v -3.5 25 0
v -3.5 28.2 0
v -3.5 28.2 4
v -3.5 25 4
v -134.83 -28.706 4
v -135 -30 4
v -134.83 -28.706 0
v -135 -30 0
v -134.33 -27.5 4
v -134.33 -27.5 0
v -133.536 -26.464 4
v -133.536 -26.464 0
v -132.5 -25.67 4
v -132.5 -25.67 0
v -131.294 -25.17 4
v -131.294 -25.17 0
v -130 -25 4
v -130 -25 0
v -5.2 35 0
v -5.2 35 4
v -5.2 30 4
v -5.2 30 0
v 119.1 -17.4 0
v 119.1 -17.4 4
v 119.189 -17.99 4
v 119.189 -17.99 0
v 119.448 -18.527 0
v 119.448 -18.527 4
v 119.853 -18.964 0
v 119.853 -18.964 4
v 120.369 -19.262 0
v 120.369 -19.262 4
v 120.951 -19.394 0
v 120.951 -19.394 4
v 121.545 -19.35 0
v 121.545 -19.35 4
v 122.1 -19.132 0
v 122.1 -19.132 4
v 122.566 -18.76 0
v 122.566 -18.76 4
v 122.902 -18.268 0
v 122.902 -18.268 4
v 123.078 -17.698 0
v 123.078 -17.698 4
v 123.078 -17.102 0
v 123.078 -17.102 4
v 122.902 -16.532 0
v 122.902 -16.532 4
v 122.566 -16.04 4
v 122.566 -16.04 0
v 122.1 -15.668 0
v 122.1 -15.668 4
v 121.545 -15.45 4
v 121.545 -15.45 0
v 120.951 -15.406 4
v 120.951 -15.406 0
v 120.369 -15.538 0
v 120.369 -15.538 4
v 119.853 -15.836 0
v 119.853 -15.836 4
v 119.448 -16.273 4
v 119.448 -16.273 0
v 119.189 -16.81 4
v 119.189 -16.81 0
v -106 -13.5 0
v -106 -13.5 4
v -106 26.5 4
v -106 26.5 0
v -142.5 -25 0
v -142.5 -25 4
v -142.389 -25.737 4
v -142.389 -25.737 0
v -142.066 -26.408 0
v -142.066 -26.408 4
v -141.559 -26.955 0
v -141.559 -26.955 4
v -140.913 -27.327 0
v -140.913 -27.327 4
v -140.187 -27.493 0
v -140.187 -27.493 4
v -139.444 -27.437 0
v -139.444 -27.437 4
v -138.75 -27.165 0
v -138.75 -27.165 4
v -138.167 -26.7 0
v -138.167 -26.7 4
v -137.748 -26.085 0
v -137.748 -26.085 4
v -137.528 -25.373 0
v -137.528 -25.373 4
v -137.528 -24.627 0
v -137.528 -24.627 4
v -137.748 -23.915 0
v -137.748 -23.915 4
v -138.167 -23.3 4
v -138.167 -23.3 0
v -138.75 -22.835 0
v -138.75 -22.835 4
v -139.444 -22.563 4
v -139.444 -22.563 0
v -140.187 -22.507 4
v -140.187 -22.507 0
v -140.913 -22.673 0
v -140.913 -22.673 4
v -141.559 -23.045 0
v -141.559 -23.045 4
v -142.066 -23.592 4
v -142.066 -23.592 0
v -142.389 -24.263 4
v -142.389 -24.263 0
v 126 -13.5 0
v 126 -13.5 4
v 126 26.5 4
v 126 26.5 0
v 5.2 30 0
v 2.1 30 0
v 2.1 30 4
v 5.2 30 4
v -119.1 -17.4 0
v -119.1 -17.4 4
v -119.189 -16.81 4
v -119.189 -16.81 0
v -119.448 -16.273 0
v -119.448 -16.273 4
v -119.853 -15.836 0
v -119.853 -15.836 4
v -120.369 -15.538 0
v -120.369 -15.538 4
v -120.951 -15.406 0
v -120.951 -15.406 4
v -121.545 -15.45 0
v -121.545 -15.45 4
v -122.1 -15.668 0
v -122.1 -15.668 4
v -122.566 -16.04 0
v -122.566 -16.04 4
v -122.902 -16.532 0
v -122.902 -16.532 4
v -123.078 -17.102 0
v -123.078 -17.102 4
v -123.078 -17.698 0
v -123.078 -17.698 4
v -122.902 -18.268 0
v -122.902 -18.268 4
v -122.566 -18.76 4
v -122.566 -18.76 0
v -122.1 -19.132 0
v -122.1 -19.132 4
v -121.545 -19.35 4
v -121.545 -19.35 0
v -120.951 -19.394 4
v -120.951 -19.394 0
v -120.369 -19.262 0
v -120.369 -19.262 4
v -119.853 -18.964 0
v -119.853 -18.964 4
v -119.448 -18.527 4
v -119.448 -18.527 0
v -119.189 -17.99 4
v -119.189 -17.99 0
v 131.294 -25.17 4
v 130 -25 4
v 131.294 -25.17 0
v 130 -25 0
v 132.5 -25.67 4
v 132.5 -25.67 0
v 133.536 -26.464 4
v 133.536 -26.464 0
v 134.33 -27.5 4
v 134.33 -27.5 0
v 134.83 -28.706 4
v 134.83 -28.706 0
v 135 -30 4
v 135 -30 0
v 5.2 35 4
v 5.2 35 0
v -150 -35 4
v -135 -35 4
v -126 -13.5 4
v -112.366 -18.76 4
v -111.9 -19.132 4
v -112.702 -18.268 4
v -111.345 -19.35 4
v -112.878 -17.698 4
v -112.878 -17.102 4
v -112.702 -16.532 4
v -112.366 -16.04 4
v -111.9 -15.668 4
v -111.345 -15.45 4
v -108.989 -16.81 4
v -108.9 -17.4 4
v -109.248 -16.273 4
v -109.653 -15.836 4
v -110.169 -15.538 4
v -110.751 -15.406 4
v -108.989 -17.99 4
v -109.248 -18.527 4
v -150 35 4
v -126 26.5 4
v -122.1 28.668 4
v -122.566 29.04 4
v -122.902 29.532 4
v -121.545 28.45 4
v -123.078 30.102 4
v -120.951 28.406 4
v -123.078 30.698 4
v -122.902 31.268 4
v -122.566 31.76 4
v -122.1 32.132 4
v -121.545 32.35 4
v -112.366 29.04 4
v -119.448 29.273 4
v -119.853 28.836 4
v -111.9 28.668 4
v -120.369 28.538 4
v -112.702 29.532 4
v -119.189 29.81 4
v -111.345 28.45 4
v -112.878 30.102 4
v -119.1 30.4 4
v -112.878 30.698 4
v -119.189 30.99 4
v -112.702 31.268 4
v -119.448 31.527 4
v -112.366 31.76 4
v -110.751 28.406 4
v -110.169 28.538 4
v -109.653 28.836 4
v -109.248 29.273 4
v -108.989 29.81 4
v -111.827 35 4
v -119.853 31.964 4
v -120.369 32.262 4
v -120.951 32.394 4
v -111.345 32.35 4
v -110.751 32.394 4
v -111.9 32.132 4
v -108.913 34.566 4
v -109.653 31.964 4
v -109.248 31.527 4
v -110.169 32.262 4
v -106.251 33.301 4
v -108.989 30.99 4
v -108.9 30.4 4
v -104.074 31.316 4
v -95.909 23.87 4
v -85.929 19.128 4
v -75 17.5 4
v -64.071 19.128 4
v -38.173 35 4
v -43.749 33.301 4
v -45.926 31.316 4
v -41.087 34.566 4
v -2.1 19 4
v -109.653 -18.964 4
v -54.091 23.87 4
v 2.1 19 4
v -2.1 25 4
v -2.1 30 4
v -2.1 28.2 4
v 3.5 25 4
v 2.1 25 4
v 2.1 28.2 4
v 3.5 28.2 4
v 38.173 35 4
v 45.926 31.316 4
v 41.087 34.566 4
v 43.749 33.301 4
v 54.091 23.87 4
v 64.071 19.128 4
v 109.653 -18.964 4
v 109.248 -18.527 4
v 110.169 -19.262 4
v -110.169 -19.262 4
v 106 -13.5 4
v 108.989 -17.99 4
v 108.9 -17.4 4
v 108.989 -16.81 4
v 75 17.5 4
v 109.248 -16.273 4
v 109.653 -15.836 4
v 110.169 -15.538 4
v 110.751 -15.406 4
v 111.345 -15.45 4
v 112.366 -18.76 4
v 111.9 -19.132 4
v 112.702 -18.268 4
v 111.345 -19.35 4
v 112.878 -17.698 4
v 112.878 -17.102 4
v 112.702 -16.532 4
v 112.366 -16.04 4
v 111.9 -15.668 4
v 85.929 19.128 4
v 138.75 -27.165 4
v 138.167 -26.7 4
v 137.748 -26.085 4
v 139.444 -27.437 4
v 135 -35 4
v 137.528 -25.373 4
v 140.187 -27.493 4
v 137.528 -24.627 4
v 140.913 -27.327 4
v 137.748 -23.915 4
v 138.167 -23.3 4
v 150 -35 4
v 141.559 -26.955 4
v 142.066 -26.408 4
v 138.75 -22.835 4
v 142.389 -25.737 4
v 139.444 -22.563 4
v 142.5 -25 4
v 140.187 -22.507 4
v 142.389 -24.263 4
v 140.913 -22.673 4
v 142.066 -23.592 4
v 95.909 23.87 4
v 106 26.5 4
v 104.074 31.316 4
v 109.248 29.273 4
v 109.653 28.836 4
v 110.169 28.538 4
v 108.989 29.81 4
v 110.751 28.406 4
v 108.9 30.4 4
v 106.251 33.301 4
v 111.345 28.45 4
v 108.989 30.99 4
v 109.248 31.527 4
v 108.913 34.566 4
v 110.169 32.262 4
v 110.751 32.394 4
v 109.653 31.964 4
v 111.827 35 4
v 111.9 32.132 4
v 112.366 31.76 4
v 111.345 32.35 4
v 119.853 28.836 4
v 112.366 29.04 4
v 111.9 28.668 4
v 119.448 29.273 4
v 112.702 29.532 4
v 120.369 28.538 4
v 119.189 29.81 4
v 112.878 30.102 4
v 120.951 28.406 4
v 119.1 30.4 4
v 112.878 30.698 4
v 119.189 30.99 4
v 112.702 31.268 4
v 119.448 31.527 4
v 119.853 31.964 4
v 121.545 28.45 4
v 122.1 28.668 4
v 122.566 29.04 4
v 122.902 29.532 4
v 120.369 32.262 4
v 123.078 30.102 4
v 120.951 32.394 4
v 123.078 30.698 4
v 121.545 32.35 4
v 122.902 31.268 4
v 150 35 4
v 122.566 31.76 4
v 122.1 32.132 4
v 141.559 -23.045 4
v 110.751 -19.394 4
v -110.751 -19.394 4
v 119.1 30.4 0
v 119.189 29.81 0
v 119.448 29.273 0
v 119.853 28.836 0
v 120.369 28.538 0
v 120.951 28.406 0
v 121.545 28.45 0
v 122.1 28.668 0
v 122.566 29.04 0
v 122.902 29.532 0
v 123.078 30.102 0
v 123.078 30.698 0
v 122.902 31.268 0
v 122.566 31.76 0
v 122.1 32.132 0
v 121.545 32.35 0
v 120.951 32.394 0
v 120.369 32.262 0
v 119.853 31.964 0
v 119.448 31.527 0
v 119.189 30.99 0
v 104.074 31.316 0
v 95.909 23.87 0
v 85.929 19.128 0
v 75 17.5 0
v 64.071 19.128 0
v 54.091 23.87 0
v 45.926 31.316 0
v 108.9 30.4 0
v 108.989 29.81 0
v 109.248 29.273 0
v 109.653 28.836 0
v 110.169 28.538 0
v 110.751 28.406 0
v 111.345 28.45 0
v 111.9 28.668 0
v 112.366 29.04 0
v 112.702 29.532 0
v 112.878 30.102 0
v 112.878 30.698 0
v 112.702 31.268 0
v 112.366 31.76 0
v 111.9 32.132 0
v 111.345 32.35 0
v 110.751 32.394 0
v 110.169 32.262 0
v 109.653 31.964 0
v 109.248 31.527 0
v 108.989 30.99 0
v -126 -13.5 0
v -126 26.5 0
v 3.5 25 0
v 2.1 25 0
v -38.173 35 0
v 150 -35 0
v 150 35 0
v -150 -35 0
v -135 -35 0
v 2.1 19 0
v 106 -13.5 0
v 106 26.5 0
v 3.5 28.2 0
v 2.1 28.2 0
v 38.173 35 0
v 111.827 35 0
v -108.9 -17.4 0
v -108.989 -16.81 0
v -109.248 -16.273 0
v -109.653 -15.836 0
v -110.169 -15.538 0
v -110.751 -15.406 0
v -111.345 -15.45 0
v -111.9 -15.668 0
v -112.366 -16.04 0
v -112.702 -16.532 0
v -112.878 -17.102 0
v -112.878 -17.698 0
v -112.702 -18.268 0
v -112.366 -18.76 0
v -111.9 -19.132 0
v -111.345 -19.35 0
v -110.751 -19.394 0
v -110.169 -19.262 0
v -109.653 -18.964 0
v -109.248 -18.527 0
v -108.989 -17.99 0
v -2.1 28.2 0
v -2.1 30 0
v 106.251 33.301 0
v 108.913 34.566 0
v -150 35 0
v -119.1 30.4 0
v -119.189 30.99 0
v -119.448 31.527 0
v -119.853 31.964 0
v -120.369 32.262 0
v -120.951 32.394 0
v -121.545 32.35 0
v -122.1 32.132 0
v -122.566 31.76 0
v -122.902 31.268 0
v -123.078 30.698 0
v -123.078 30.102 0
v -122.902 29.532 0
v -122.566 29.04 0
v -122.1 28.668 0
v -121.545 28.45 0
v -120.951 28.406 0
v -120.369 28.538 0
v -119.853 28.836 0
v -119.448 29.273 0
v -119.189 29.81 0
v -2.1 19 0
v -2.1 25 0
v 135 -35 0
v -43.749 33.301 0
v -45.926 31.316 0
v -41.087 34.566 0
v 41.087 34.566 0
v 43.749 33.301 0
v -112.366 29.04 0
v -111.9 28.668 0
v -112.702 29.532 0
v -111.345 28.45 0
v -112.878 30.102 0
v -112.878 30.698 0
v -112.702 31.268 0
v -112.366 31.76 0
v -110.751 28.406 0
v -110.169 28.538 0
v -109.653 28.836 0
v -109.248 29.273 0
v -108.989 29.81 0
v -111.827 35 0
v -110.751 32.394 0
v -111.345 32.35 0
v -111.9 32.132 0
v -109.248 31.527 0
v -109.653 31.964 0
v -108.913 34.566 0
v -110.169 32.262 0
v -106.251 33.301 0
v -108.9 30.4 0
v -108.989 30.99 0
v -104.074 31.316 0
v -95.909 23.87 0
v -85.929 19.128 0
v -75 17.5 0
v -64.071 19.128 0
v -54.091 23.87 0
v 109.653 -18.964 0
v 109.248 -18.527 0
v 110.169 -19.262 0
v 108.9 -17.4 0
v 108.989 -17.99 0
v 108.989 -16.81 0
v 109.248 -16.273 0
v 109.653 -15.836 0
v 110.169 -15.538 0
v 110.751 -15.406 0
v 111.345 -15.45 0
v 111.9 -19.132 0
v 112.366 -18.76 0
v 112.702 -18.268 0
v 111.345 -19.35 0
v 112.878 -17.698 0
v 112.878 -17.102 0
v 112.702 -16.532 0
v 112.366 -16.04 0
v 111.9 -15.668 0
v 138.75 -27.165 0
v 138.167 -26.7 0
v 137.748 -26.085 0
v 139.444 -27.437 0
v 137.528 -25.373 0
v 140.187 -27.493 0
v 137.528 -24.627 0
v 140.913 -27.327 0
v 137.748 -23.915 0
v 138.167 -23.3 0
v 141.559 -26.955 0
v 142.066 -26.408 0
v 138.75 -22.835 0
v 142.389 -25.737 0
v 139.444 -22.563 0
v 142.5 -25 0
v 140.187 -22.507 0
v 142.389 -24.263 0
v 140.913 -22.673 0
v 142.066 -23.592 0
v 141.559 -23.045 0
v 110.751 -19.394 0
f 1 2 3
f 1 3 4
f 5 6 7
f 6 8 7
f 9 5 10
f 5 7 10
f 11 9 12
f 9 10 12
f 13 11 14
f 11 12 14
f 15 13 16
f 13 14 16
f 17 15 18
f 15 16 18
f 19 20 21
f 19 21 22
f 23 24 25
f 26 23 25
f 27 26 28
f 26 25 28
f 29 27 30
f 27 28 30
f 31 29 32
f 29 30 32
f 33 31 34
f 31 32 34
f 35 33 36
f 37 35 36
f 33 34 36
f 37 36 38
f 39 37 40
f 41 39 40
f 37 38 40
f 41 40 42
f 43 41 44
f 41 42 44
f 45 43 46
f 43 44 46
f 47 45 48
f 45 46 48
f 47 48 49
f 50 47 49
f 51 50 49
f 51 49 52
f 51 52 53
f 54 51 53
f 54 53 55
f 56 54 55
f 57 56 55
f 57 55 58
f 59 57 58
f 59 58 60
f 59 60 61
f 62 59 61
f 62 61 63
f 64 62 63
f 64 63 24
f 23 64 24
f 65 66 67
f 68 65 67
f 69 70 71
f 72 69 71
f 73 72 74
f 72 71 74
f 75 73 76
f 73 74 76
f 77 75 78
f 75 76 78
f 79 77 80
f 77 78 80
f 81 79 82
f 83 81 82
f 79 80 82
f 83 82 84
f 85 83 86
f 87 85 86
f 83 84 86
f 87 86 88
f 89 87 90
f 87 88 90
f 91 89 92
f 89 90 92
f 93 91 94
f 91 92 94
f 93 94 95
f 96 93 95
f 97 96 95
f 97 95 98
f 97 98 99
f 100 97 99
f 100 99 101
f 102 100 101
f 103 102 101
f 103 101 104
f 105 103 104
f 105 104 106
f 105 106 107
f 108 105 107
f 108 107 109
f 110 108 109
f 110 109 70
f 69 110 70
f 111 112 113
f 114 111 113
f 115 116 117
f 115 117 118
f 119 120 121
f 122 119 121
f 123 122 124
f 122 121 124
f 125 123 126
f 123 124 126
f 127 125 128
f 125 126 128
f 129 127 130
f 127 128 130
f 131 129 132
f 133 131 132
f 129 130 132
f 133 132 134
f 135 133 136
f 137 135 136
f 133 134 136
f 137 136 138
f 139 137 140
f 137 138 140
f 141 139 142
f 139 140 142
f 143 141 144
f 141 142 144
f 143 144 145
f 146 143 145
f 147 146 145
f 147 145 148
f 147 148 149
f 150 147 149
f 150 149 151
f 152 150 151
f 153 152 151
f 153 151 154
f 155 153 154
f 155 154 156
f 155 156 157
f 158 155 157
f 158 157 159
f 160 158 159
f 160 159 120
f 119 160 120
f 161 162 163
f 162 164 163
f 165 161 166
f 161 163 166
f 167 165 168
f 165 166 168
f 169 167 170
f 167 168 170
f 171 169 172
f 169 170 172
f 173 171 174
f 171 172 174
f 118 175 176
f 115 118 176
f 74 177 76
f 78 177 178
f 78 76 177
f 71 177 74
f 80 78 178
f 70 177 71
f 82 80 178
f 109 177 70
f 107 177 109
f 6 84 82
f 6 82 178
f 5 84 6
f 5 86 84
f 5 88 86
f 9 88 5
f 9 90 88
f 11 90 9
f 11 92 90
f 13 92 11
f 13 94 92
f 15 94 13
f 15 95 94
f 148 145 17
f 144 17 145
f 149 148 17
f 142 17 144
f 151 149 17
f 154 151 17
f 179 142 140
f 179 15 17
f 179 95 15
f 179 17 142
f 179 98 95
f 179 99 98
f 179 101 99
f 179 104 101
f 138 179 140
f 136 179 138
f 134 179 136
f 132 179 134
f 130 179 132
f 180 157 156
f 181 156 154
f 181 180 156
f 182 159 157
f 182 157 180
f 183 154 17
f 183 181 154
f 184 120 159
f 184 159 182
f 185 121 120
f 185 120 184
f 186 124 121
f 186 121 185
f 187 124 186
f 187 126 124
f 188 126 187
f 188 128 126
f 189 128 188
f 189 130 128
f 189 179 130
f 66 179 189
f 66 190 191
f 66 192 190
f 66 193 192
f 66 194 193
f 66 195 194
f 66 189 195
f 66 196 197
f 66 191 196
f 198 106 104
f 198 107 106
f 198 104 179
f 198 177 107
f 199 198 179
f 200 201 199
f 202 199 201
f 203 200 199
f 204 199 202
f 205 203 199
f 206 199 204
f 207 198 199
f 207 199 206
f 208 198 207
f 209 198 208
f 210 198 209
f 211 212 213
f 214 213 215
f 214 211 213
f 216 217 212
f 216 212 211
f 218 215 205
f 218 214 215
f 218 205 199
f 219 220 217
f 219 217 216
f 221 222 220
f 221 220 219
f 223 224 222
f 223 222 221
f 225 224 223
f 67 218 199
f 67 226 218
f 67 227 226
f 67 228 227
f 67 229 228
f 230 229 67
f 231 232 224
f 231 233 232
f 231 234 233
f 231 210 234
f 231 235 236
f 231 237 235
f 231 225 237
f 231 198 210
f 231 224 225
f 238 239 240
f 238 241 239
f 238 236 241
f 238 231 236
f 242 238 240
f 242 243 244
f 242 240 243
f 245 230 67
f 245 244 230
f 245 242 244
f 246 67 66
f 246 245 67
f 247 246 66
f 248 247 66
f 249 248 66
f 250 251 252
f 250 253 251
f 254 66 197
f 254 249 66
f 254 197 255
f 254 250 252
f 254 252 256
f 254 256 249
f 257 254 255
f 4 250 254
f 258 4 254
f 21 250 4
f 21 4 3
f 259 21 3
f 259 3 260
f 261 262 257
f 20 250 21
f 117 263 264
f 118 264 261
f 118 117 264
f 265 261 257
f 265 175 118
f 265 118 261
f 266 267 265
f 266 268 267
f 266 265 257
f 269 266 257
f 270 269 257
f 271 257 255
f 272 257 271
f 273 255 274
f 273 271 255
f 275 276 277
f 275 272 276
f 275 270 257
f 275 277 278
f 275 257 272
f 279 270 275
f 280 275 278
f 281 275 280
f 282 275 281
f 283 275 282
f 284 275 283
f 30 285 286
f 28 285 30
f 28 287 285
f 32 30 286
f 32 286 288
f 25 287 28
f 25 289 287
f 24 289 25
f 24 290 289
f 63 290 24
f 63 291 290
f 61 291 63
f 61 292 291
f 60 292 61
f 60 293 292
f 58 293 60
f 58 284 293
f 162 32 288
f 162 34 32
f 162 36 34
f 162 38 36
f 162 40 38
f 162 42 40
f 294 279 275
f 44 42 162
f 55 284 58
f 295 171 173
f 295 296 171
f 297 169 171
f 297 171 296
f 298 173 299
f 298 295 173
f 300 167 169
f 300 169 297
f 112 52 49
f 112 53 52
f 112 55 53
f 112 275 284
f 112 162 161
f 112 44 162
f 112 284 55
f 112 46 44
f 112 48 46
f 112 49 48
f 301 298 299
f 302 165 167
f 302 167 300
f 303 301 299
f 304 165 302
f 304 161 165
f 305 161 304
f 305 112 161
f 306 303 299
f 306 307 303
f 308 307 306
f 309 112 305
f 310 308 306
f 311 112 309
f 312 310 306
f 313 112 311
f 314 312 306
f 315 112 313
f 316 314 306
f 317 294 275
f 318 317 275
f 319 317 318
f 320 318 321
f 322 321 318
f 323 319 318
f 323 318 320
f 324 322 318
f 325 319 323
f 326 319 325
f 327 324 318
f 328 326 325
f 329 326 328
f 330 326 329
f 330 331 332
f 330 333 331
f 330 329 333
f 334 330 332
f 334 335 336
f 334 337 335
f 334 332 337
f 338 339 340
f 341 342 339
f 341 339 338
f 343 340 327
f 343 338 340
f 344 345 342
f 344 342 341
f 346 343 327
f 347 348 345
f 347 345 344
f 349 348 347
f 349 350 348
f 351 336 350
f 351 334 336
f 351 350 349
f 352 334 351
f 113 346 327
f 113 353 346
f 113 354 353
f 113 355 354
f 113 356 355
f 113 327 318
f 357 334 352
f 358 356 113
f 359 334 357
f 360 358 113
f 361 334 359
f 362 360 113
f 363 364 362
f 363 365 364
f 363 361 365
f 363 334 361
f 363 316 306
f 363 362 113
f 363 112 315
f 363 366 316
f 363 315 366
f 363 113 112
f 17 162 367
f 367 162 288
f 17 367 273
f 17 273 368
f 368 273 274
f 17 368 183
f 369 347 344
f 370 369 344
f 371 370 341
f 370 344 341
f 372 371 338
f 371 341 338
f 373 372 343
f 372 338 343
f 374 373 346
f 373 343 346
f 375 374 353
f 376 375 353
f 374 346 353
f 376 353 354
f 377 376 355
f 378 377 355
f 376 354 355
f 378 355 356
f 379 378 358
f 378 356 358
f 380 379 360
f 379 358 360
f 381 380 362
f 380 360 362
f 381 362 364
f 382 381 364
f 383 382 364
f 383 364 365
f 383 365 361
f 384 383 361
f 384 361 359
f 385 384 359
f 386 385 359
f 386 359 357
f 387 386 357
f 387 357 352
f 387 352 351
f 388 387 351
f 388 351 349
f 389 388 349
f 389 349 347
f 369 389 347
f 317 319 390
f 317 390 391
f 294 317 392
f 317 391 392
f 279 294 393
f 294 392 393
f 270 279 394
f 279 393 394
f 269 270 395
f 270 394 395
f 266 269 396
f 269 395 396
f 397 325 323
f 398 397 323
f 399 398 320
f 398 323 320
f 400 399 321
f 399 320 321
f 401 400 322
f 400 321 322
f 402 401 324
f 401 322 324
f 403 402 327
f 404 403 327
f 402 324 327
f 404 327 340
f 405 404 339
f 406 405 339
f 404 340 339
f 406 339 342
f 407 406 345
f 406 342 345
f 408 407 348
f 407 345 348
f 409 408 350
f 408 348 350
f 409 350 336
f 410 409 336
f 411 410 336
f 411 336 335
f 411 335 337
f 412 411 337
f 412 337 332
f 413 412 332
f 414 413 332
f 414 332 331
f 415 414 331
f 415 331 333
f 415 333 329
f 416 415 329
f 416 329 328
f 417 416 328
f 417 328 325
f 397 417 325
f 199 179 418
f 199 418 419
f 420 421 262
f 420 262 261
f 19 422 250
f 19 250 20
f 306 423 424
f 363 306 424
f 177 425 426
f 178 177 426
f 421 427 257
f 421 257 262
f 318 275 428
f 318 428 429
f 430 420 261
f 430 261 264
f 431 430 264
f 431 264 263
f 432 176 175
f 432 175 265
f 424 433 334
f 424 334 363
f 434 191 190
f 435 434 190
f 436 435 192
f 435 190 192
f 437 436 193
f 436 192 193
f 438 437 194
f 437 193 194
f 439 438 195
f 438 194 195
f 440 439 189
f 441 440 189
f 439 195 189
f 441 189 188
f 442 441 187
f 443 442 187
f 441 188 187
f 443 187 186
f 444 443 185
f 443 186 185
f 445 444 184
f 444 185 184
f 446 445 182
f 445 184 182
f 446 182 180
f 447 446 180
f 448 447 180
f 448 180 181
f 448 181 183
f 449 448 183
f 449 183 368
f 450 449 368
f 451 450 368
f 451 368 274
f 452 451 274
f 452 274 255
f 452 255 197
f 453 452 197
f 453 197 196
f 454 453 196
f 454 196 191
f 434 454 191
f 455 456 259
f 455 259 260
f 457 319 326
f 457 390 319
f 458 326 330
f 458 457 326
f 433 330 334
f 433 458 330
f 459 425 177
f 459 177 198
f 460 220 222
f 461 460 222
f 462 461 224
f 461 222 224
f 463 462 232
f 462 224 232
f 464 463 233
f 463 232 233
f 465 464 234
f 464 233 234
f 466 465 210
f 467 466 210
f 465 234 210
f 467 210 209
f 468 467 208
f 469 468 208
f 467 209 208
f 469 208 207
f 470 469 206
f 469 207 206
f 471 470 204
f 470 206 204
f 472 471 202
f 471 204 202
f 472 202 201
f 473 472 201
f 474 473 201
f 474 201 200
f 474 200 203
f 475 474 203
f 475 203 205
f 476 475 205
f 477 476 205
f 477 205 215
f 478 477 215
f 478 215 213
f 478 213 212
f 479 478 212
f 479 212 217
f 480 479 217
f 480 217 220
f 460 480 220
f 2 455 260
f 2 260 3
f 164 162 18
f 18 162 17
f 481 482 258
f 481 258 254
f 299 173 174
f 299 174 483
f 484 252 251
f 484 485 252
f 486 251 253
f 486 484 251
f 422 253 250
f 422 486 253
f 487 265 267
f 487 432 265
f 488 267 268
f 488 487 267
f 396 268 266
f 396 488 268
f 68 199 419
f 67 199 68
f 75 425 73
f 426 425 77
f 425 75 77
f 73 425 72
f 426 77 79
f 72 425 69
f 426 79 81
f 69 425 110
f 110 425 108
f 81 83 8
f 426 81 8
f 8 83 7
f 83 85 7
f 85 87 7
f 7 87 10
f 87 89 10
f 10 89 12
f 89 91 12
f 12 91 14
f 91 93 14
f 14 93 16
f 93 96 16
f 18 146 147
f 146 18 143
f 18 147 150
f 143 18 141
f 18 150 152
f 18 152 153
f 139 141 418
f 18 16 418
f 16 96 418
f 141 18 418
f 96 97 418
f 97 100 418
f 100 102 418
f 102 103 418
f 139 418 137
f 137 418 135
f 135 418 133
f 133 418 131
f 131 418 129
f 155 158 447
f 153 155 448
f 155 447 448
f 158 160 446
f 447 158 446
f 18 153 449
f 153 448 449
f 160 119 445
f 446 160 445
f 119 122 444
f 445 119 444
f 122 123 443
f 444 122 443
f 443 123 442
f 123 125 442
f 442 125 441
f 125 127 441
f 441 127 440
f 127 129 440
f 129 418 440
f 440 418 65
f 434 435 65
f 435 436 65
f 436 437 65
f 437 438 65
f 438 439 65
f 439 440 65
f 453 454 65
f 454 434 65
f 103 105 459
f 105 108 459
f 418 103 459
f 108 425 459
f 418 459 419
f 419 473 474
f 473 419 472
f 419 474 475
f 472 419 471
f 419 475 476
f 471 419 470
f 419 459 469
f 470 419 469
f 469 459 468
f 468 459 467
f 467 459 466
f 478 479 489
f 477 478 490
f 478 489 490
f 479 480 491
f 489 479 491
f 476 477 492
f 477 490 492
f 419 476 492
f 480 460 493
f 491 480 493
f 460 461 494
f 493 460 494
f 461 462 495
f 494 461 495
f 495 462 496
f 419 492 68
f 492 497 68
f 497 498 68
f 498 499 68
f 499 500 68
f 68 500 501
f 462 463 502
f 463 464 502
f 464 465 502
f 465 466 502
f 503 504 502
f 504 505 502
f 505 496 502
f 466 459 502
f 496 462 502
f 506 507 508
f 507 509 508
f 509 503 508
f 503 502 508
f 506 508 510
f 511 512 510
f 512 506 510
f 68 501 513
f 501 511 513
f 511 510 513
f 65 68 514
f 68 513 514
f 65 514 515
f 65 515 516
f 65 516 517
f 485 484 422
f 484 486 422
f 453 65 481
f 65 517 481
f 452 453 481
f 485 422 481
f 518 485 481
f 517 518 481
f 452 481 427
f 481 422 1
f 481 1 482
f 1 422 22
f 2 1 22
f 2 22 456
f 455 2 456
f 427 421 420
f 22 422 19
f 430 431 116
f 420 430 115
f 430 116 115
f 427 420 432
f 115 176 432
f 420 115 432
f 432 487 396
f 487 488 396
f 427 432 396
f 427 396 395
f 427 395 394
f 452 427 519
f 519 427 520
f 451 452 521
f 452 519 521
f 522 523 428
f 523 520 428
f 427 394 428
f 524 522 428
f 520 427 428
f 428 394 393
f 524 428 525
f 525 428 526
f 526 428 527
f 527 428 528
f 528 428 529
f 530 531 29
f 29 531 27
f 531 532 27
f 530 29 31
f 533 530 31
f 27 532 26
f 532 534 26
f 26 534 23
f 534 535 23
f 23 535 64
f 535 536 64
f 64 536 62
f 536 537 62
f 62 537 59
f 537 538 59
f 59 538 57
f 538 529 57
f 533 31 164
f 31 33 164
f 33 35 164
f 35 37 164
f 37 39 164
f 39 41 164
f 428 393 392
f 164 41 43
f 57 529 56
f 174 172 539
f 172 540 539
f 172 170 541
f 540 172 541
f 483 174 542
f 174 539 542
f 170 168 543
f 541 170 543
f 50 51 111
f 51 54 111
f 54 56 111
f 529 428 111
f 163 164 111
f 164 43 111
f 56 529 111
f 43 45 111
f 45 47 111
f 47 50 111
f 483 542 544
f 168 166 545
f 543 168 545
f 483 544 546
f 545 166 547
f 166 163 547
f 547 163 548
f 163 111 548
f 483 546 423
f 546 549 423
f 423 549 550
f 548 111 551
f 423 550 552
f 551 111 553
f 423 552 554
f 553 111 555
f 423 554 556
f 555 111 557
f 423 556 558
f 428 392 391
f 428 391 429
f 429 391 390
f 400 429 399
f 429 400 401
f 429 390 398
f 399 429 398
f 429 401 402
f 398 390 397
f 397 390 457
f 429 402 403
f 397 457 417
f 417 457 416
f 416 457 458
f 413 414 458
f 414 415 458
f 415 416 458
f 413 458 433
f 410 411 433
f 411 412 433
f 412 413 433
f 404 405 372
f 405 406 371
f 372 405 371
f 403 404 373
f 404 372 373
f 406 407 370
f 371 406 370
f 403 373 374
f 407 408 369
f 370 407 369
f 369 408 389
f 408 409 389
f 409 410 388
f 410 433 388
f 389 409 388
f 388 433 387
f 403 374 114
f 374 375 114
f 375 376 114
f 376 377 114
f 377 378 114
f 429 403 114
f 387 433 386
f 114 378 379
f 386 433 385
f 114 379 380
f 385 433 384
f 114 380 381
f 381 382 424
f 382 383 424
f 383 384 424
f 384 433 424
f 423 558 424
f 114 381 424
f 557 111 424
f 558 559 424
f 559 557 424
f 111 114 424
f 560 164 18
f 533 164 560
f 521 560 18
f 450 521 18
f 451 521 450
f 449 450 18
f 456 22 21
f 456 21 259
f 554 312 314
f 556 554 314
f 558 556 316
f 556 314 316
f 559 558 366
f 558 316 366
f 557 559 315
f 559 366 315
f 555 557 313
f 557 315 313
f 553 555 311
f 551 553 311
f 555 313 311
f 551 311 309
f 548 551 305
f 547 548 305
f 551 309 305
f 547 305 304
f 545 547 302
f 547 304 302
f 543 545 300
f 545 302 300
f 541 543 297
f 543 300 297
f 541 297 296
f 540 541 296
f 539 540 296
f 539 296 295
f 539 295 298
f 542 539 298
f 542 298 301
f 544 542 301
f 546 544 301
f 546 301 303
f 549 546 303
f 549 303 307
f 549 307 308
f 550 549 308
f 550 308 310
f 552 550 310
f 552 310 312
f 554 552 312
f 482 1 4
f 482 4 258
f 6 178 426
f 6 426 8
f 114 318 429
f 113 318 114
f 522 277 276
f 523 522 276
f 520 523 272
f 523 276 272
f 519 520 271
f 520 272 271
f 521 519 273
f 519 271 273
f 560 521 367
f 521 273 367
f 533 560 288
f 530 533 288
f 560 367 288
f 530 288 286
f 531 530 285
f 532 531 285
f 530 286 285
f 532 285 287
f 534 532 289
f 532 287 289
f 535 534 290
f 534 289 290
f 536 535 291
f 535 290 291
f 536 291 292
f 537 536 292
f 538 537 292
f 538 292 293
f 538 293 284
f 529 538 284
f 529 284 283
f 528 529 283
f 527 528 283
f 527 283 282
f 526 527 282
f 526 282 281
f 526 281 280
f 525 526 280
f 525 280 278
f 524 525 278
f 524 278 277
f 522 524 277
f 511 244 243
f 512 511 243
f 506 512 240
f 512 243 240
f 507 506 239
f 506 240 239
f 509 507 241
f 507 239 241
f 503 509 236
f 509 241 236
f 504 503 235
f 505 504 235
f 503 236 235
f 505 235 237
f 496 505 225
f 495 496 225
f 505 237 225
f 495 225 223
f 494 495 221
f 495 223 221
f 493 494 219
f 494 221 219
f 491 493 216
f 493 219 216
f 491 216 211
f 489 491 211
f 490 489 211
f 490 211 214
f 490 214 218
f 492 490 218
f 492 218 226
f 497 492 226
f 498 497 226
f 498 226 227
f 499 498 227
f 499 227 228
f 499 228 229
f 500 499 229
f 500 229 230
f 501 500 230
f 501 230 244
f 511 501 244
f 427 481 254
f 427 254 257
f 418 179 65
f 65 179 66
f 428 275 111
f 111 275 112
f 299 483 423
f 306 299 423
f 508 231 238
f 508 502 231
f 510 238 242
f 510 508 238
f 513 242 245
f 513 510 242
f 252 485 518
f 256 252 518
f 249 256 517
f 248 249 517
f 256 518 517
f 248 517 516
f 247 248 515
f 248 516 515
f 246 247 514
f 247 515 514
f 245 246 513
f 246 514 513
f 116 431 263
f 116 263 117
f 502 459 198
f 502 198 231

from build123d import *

# Parameters (mm, degrees)
ESQUISSE1_W             = 300
ESQUISSE1_H             = 70
BOSS_EXTRU_1_DEPTH      = 4
ESQUISSE2_R             = 2.5
ENL_V_MAT_EXTRU_1_DEPTH = 155.081147452
ESQUISSE3_R             = 37.5
ENL_V_MAT_EXTRU_2_DEPTH = 155.081147452
CONG_1_R                = 10
ESQUISSE4_R             = 2
ESQUISSE4_W             = 20
ESQUISSE4_H             = 40
ENL_V_MAT_EXTRU_3_DEPTH = 155.081147452
CONG_2_R                = 5
ESQUISSE5_W             = 10.4
ESQUISSE5_H             = 4.4
ENL_V_MAT_EXTRU_4_DEPTH = 5
ENL_V_MAT_EXTRU_5_DEPTH = 155.081147452


with BuildPart() as part:
    # Esquisse1 → Boss.-Extru.1 (new body)
    with BuildSketch(Plane.XY):
        Rectangle(ESQUISSE1_W, ESQUISSE1_H)
    extrude(amount=BOSS_EXTRU_1_DEPTH)

    # Esquisse2 → Enlèv. mat.-Extru.1 (cut, through all)
    with BuildSketch(Plane.XY.offset(4)):
        with Locations((140, -25)):
            Circle(ESQUISSE2_R)
        with Locations(Location((-140, -25, 0), (0, 0, 180))):
            Circle(ESQUISSE2_R)
        Polygon((-135, -25), (0, -25), (135, -25), (135, -35), (0, -35), (-135, -35), align=None)
    extrude(amount=-ENL_V_MAT_EXTRU_1_DEPTH, mode=Mode.SUBTRACT)

    # Esquisse3 → Enlèv. mat.-Extru.2 (cut, through all)
    with BuildSketch(Plane(origin=(0, 0, 0), x_dir=(-1, 0, 0), z_dir=(0, 0, -1))):
        with Locations((75, 55)):
            Circle(ESQUISSE3_R)
        with Locations((-75, 55)):
            Circle(ESQUISSE3_R)
    extrude(amount=-ENL_V_MAT_EXTRU_2_DEPTH, mode=Mode.SUBTRACT)

    # Congé1
    cong_1_edges = [part.edges().sort_by_distance(p)[0] for p in [
        (-106.721443851, 35, 2),
        (-43.278556149, 35, 2),
        (43.278556149, 35, 2),
        (106.721443851, 35, 2),
    ]]
    fillet(cong_1_edges, radius=CONG_1_R)

    # Esquisse4 → Enlèv. mat.-Extru.3 (cut, through all)
    with BuildSketch(Plane.XY.offset(4)):
        with Locations((-110.9, 30.4)):
            Circle(ESQUISSE4_R)
        with Locations((-121.1, 30.4)):
            Circle(ESQUISSE4_R)
        with Locations((-110.9, -17.4)):
            Circle(ESQUISSE4_R)
        with Locations((-121.1, -17.4)):
            Circle(ESQUISSE4_R)
        with Locations(Location((121.1, -17.4, 0), (0, 0, 180))):
            Circle(ESQUISSE4_R)
        with Locations(Location((110.9, -17.4, 0), (0, 0, 180))):
            Circle(ESQUISSE4_R)
        with Locations(Location((121.1, 30.4, 0), (0, 0, 180))):
            Circle(ESQUISSE4_R)
        with Locations(Location((110.9, 30.4, 0), (0, 0, 180))):
            Circle(ESQUISSE4_R)
        with Locations((-116, 6.5)):
            Rectangle(ESQUISSE4_W, ESQUISSE4_H)
        with Locations((116, 6.5)):
            Rectangle(ESQUISSE4_W, ESQUISSE4_H)
    extrude(amount=-ENL_V_MAT_EXTRU_3_DEPTH, mode=Mode.SUBTRACT)

    # Congé2
    cong_2_edges = [part.edges().sort_by_distance(p)[0] for p in [
        (-135, -25, 2),
        (135, -25, 2),
    ]]
    fillet(cong_2_edges, radius=CONG_2_R)

    # Esquisse5 → Enlèv. mat.-Extru.4 (cut)
    with BuildSketch(Plane(origin=(0, 35, 0), x_dir=(1, 0, 0), z_dir=(0, 1, 0))):
        with Locations((0, -2)):
            Rectangle(ESQUISSE5_W, ESQUISSE5_H)
    extrude(amount=-ENL_V_MAT_EXTRU_4_DEPTH, mode=Mode.SUBTRACT)

    # Esquisse6 → Enlèv. mat.-Extru.5 (cut, through all)
    with BuildSketch(Plane(origin=(0, 0, 0), x_dir=(-1, 0, 0), z_dir=(0, 0, -1))):
        Polygon((-2.1, 30), (2.1, 30), (2.1, 28.2), (3.5, 28.2), (3.5, 25), (2.1, 25), (2.1, 19), (-2.1, 19), (-2.1, 25), (-3.5, 25), (-3.5, 28.2), (-2.1, 28.2), align=None)
    extrude(amount=-ENL_V_MAT_EXTRU_5_DEPTH, mode=Mode.SUBTRACT)


solid = part.part
